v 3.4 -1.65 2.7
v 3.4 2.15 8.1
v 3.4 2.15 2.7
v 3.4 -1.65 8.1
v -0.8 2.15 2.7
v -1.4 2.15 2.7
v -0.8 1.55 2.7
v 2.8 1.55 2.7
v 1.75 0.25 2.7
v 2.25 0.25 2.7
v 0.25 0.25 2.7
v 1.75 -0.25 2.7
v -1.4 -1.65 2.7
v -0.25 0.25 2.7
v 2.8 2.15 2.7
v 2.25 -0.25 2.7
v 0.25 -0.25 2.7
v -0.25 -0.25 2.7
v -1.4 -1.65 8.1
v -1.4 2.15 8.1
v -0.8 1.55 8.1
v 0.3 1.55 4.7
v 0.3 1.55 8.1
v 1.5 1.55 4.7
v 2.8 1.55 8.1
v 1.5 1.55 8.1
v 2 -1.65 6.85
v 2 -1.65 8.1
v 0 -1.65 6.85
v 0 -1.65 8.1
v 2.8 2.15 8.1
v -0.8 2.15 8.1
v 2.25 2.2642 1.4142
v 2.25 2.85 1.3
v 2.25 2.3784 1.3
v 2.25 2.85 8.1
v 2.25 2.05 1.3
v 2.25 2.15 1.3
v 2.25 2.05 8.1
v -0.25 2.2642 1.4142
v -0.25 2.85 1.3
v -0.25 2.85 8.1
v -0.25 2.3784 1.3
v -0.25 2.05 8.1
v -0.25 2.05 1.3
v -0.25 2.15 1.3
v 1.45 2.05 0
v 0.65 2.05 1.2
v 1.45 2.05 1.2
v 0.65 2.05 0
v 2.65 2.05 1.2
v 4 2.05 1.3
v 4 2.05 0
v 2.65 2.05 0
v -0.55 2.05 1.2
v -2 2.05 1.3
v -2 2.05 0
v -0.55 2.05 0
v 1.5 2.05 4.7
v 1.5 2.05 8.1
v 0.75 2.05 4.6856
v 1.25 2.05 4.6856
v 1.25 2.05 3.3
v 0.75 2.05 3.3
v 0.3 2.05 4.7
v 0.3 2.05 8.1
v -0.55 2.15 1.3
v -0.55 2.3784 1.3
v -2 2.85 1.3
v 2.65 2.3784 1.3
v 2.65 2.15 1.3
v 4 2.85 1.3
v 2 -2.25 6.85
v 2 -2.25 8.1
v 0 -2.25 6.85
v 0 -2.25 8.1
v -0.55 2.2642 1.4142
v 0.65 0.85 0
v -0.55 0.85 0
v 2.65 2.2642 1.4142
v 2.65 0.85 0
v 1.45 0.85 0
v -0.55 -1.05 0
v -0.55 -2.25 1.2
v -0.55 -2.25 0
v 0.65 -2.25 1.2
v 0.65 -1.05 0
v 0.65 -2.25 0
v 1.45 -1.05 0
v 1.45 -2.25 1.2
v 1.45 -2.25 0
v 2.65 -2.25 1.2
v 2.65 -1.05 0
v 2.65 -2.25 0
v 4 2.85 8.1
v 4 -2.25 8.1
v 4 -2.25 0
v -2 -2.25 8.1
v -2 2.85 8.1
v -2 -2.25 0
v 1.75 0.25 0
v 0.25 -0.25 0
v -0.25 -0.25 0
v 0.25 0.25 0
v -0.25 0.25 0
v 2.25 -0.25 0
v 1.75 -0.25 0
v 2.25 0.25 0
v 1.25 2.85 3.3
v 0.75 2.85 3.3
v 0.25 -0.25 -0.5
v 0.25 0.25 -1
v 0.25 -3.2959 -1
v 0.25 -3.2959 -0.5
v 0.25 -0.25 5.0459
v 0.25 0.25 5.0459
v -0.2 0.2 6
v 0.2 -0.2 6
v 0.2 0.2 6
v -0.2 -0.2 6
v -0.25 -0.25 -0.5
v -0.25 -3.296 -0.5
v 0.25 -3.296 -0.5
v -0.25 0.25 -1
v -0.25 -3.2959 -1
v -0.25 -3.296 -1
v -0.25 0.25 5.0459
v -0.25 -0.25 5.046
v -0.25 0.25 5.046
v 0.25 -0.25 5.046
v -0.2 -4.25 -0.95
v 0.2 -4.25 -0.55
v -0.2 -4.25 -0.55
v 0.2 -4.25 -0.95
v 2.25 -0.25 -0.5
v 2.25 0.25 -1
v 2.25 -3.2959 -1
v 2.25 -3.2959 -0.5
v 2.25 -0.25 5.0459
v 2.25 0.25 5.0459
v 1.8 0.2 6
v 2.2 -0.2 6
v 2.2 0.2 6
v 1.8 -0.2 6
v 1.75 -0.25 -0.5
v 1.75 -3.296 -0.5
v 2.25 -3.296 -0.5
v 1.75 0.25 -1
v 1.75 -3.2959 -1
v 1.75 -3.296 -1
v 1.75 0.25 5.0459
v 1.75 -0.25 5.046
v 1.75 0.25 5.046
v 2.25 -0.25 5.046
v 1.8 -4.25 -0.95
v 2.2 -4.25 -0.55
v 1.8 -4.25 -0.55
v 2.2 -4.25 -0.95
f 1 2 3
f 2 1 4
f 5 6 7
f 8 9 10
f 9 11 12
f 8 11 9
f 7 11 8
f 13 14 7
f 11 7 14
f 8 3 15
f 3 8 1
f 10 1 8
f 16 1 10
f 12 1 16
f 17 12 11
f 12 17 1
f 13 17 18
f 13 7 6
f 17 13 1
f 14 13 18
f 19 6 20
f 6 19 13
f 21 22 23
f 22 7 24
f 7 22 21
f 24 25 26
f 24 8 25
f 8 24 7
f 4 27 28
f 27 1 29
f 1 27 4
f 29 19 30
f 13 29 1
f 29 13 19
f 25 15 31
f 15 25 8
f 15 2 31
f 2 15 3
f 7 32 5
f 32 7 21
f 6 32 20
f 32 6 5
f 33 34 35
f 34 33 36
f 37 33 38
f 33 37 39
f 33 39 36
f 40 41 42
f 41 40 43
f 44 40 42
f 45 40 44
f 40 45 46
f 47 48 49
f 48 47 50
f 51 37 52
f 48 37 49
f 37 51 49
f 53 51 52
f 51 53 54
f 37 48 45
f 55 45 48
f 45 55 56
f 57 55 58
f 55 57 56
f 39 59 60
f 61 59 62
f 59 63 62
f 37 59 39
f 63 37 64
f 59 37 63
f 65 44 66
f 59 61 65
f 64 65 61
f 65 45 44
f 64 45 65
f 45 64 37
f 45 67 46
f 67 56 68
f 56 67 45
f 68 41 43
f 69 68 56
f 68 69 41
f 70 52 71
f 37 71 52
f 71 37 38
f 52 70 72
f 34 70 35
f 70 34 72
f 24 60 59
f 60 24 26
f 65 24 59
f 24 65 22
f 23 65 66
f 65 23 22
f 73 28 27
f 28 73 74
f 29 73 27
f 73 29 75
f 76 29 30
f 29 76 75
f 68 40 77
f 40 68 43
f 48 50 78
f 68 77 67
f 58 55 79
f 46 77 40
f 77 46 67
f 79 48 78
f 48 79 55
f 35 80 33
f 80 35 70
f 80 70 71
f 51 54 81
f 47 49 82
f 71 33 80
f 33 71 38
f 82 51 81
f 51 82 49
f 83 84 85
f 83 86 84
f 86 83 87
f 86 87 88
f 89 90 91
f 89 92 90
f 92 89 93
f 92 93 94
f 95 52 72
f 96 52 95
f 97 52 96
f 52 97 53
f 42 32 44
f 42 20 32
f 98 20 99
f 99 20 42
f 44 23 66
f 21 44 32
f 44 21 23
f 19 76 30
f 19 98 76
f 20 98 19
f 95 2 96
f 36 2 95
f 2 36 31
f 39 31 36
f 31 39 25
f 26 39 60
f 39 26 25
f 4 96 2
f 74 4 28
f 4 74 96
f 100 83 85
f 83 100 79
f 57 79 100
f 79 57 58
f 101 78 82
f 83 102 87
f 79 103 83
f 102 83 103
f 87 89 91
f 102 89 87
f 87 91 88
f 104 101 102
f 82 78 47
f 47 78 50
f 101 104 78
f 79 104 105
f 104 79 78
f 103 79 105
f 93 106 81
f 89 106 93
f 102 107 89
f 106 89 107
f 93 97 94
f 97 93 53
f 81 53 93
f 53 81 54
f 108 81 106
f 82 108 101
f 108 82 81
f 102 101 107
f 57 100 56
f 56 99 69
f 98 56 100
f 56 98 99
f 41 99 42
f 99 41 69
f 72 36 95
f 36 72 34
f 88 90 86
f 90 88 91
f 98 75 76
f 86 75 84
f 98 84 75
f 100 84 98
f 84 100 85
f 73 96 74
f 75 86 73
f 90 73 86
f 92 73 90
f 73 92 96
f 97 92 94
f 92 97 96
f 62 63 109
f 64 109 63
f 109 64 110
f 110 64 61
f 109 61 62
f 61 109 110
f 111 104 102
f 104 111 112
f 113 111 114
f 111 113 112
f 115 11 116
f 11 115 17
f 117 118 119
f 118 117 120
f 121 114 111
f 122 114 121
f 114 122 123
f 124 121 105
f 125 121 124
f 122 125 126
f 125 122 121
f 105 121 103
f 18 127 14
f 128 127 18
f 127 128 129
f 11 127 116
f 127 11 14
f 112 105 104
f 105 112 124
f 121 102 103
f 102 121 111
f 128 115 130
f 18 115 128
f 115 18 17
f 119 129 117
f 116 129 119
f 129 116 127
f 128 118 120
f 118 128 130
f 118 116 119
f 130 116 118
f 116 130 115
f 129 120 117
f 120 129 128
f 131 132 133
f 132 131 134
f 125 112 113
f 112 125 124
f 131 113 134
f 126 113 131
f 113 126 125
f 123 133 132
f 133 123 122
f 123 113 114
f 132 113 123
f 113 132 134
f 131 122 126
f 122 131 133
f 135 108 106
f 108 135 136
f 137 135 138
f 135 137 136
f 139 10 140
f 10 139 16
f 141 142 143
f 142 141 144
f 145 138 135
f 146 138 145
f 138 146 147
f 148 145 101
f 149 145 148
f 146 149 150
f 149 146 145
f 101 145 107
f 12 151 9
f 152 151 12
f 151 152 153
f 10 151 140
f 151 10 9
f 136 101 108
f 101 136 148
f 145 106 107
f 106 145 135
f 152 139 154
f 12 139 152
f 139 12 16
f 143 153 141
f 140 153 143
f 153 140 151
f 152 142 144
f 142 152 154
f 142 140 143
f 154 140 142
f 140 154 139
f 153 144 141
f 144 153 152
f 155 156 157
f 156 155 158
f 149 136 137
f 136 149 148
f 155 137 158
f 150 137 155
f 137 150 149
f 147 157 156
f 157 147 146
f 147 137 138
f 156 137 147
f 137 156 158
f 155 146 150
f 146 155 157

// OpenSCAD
module pin_V(pin_heigth=9,pin_size=0.5,pin_angle=3,pin_chanfer=0.05)
{
    epsilon=0.01;
    difference(){
        cube([pin_size,pin_size,pin_heigth]);
        translate([-epsilon,pin_size-pin_chanfer,0])rotate([-pin_angle,0,0])cube([pin_size+2*epsilon,pin_size,pin_heigth]);
        translate([-epsilon,pin_chanfer,0])rotate([pin_angle,0,0])translate([0,-pin_size,0])cube([pin_size+2*epsilon,pin_size,pin_heigth]);     
        translate([pin_size-pin_chanfer,-epsilon,0])rotate([0,pin_angle,0])cube([pin_size,pin_size+2*epsilon,pin_heigth]);
        translate([pin_chanfer,-epsilon,0])rotate([0,-pin_angle,0])translate([-pin_size,0,0])cube([pin_size,pin_size+2*epsilon,pin_heigth]);
        translate([-epsilon,pin_size-pin_chanfer,pin_heigth])rotate([pin_angle,0,0])translate([0,0,-pin_heigth])cube([pin_size+2*epsilon,pin_size,pin_heigth]);
        translate([-epsilon,pin_chanfer,pin_heigth])rotate([-pin_angle,0,0])translate([0,-pin_size,-pin_heigth])cube([pin_size+2*epsilon,pin_size,pin_heigth]);     
        translate([pin_size-pin_chanfer,-epsilon,pin_heigth])rotate([0,-pin_angle,0])translate([0,0,-pin_heigth])cube([pin_size,pin_size+2*epsilon,pin_heigth]);
        translate([pin_chanfer,-epsilon,pin_heigth])rotate([0,pin_angle,0])translate([-pin_size,0,-pin_heigth])cube([pin_size,pin_size+2*epsilon,pin_heigth]);
     
    }
}

module pin_01(pin_heigth=9,pin_size=0.5,pin_angle=3,pin_chanfer=0.05){
    epsilon=0.01;
    difference(){
        cube([pin_size,pin_size,pin_heigth]);
        translate([-epsilon,pin_size-pin_chanfer,pin_heigth])rotate([pin_angle,0,0])translate([0,0,-pin_heigth])cube([pin_size+2*epsilon,pin_size,pin_heigth]);
        translate([-epsilon,pin_chanfer,pin_heigth])rotate([-pin_angle,0,0])translate([0,-pin_size,-pin_heigth])cube([pin_size+2*epsilon,pin_size,pin_heigth]);     
        translate([pin_size-pin_chanfer,-epsilon,pin_heigth])rotate([0,-pin_angle,0])translate([0,0,-pin_heigth])cube([pin_size,pin_size+2*epsilon,pin_heigth]);
        translate([pin_chanfer,-epsilon,pin_heigth])rotate([0,pin_angle,0])translate([-pin_size,0,-pin_heigth])cube([pin_size,pin_size+2*epsilon,pin_heigth]);     
    }
}
module pin_02(pin_heigth=9,pin_size=0.5,pin_angle=3,pin_chanfer=0.05){
    epsilon=0.01;
    difference(){
        cube([pin_size,pin_size,pin_heigth]);
        translate([-epsilon,pin_size-pin_chanfer,0])rotate([-pin_angle,0,0])cube([pin_size+2*epsilon,pin_size,pin_heigth]);
        translate([-epsilon,pin_chanfer,0])rotate([pin_angle,0,0])translate([0,-pin_size,0])cube([pin_size+2*epsilon,pin_size,pin_heigth]);     
        translate([pin_size-pin_chanfer,-epsilon,0])rotate([0,pin_angle,0])cube([pin_size,pin_size+2*epsilon,pin_heigth]);
        translate([pin_chanfer,-epsilon,0])rotate([0,-pin_angle,0])translate([-pin_size,0,0])cube([pin_size,pin_size+2*epsilon,pin_heigth]);
    }
}
module pin(pin_heigth=9,pin_size=0.5,pin_angle=3,pin_chanfer=0.05)
{
    translate([0,0,pin_heigth/2-1.5]) pin_01(pin_heigth/2+2);
    translate([0,-4,4.5-1.5])  rotate([270,0,0]) pin_02(pin_heigth/2);
}

epsilon = 1e-3;
translate([-2,-2.25,0])union(){
    difference(){
        cube([6,5.1,8.1]);
        union(){
            translate([0.6,0.6,2.7])union(){
                cube([6-2*0.6,3.2,5.4+2*epsilon]);
                translate([4.2,0.6,0])cube([0.6,3.2,5.4+2*epsilon]);
                translate([0,0.6,0])cube([0.6,3.2,5.4+2*epsilon]);
            }
            translate([1.75,4.3,-1])cube([2.5,2,12]);
            translate([-epsilon,4.3,-epsilon])cube([6+2*epsilon,0.9+epsilon,1.3+epsilon]);
            translate([2.3,3.7,4.7])cube([1.2,1,3.4+epsilon]);
            translate([2,-epsilon,6.85])cube([2,1,1.25+epsilon]);
            translate([1.45,3.1,0])rotate([-45,0,0])cube([1.2,3,2]);
            translate([3.45,3.1,0])rotate([-45,0,0])cube([1.2,3,2]);      
            
            translate([1.45,-.8,2])rotate([225,0,0])cube([1.2,3,4]);
            translate([3.45,-.8,2])rotate([225,0,0])cube([1.2,3,4]);

        }
    }
    translate([2.75,3.8,3.3])
    difference(){
        cube([0.5,1.3,1.4]);
        translate([-0.5,1.3,0])rotate([30,0,0])cube([1.5,1.3,5]);
    }
    color("RED") translate([1.75,2,-3.5])pin();
    translate([3.75,2,-3.5])pin();
}
